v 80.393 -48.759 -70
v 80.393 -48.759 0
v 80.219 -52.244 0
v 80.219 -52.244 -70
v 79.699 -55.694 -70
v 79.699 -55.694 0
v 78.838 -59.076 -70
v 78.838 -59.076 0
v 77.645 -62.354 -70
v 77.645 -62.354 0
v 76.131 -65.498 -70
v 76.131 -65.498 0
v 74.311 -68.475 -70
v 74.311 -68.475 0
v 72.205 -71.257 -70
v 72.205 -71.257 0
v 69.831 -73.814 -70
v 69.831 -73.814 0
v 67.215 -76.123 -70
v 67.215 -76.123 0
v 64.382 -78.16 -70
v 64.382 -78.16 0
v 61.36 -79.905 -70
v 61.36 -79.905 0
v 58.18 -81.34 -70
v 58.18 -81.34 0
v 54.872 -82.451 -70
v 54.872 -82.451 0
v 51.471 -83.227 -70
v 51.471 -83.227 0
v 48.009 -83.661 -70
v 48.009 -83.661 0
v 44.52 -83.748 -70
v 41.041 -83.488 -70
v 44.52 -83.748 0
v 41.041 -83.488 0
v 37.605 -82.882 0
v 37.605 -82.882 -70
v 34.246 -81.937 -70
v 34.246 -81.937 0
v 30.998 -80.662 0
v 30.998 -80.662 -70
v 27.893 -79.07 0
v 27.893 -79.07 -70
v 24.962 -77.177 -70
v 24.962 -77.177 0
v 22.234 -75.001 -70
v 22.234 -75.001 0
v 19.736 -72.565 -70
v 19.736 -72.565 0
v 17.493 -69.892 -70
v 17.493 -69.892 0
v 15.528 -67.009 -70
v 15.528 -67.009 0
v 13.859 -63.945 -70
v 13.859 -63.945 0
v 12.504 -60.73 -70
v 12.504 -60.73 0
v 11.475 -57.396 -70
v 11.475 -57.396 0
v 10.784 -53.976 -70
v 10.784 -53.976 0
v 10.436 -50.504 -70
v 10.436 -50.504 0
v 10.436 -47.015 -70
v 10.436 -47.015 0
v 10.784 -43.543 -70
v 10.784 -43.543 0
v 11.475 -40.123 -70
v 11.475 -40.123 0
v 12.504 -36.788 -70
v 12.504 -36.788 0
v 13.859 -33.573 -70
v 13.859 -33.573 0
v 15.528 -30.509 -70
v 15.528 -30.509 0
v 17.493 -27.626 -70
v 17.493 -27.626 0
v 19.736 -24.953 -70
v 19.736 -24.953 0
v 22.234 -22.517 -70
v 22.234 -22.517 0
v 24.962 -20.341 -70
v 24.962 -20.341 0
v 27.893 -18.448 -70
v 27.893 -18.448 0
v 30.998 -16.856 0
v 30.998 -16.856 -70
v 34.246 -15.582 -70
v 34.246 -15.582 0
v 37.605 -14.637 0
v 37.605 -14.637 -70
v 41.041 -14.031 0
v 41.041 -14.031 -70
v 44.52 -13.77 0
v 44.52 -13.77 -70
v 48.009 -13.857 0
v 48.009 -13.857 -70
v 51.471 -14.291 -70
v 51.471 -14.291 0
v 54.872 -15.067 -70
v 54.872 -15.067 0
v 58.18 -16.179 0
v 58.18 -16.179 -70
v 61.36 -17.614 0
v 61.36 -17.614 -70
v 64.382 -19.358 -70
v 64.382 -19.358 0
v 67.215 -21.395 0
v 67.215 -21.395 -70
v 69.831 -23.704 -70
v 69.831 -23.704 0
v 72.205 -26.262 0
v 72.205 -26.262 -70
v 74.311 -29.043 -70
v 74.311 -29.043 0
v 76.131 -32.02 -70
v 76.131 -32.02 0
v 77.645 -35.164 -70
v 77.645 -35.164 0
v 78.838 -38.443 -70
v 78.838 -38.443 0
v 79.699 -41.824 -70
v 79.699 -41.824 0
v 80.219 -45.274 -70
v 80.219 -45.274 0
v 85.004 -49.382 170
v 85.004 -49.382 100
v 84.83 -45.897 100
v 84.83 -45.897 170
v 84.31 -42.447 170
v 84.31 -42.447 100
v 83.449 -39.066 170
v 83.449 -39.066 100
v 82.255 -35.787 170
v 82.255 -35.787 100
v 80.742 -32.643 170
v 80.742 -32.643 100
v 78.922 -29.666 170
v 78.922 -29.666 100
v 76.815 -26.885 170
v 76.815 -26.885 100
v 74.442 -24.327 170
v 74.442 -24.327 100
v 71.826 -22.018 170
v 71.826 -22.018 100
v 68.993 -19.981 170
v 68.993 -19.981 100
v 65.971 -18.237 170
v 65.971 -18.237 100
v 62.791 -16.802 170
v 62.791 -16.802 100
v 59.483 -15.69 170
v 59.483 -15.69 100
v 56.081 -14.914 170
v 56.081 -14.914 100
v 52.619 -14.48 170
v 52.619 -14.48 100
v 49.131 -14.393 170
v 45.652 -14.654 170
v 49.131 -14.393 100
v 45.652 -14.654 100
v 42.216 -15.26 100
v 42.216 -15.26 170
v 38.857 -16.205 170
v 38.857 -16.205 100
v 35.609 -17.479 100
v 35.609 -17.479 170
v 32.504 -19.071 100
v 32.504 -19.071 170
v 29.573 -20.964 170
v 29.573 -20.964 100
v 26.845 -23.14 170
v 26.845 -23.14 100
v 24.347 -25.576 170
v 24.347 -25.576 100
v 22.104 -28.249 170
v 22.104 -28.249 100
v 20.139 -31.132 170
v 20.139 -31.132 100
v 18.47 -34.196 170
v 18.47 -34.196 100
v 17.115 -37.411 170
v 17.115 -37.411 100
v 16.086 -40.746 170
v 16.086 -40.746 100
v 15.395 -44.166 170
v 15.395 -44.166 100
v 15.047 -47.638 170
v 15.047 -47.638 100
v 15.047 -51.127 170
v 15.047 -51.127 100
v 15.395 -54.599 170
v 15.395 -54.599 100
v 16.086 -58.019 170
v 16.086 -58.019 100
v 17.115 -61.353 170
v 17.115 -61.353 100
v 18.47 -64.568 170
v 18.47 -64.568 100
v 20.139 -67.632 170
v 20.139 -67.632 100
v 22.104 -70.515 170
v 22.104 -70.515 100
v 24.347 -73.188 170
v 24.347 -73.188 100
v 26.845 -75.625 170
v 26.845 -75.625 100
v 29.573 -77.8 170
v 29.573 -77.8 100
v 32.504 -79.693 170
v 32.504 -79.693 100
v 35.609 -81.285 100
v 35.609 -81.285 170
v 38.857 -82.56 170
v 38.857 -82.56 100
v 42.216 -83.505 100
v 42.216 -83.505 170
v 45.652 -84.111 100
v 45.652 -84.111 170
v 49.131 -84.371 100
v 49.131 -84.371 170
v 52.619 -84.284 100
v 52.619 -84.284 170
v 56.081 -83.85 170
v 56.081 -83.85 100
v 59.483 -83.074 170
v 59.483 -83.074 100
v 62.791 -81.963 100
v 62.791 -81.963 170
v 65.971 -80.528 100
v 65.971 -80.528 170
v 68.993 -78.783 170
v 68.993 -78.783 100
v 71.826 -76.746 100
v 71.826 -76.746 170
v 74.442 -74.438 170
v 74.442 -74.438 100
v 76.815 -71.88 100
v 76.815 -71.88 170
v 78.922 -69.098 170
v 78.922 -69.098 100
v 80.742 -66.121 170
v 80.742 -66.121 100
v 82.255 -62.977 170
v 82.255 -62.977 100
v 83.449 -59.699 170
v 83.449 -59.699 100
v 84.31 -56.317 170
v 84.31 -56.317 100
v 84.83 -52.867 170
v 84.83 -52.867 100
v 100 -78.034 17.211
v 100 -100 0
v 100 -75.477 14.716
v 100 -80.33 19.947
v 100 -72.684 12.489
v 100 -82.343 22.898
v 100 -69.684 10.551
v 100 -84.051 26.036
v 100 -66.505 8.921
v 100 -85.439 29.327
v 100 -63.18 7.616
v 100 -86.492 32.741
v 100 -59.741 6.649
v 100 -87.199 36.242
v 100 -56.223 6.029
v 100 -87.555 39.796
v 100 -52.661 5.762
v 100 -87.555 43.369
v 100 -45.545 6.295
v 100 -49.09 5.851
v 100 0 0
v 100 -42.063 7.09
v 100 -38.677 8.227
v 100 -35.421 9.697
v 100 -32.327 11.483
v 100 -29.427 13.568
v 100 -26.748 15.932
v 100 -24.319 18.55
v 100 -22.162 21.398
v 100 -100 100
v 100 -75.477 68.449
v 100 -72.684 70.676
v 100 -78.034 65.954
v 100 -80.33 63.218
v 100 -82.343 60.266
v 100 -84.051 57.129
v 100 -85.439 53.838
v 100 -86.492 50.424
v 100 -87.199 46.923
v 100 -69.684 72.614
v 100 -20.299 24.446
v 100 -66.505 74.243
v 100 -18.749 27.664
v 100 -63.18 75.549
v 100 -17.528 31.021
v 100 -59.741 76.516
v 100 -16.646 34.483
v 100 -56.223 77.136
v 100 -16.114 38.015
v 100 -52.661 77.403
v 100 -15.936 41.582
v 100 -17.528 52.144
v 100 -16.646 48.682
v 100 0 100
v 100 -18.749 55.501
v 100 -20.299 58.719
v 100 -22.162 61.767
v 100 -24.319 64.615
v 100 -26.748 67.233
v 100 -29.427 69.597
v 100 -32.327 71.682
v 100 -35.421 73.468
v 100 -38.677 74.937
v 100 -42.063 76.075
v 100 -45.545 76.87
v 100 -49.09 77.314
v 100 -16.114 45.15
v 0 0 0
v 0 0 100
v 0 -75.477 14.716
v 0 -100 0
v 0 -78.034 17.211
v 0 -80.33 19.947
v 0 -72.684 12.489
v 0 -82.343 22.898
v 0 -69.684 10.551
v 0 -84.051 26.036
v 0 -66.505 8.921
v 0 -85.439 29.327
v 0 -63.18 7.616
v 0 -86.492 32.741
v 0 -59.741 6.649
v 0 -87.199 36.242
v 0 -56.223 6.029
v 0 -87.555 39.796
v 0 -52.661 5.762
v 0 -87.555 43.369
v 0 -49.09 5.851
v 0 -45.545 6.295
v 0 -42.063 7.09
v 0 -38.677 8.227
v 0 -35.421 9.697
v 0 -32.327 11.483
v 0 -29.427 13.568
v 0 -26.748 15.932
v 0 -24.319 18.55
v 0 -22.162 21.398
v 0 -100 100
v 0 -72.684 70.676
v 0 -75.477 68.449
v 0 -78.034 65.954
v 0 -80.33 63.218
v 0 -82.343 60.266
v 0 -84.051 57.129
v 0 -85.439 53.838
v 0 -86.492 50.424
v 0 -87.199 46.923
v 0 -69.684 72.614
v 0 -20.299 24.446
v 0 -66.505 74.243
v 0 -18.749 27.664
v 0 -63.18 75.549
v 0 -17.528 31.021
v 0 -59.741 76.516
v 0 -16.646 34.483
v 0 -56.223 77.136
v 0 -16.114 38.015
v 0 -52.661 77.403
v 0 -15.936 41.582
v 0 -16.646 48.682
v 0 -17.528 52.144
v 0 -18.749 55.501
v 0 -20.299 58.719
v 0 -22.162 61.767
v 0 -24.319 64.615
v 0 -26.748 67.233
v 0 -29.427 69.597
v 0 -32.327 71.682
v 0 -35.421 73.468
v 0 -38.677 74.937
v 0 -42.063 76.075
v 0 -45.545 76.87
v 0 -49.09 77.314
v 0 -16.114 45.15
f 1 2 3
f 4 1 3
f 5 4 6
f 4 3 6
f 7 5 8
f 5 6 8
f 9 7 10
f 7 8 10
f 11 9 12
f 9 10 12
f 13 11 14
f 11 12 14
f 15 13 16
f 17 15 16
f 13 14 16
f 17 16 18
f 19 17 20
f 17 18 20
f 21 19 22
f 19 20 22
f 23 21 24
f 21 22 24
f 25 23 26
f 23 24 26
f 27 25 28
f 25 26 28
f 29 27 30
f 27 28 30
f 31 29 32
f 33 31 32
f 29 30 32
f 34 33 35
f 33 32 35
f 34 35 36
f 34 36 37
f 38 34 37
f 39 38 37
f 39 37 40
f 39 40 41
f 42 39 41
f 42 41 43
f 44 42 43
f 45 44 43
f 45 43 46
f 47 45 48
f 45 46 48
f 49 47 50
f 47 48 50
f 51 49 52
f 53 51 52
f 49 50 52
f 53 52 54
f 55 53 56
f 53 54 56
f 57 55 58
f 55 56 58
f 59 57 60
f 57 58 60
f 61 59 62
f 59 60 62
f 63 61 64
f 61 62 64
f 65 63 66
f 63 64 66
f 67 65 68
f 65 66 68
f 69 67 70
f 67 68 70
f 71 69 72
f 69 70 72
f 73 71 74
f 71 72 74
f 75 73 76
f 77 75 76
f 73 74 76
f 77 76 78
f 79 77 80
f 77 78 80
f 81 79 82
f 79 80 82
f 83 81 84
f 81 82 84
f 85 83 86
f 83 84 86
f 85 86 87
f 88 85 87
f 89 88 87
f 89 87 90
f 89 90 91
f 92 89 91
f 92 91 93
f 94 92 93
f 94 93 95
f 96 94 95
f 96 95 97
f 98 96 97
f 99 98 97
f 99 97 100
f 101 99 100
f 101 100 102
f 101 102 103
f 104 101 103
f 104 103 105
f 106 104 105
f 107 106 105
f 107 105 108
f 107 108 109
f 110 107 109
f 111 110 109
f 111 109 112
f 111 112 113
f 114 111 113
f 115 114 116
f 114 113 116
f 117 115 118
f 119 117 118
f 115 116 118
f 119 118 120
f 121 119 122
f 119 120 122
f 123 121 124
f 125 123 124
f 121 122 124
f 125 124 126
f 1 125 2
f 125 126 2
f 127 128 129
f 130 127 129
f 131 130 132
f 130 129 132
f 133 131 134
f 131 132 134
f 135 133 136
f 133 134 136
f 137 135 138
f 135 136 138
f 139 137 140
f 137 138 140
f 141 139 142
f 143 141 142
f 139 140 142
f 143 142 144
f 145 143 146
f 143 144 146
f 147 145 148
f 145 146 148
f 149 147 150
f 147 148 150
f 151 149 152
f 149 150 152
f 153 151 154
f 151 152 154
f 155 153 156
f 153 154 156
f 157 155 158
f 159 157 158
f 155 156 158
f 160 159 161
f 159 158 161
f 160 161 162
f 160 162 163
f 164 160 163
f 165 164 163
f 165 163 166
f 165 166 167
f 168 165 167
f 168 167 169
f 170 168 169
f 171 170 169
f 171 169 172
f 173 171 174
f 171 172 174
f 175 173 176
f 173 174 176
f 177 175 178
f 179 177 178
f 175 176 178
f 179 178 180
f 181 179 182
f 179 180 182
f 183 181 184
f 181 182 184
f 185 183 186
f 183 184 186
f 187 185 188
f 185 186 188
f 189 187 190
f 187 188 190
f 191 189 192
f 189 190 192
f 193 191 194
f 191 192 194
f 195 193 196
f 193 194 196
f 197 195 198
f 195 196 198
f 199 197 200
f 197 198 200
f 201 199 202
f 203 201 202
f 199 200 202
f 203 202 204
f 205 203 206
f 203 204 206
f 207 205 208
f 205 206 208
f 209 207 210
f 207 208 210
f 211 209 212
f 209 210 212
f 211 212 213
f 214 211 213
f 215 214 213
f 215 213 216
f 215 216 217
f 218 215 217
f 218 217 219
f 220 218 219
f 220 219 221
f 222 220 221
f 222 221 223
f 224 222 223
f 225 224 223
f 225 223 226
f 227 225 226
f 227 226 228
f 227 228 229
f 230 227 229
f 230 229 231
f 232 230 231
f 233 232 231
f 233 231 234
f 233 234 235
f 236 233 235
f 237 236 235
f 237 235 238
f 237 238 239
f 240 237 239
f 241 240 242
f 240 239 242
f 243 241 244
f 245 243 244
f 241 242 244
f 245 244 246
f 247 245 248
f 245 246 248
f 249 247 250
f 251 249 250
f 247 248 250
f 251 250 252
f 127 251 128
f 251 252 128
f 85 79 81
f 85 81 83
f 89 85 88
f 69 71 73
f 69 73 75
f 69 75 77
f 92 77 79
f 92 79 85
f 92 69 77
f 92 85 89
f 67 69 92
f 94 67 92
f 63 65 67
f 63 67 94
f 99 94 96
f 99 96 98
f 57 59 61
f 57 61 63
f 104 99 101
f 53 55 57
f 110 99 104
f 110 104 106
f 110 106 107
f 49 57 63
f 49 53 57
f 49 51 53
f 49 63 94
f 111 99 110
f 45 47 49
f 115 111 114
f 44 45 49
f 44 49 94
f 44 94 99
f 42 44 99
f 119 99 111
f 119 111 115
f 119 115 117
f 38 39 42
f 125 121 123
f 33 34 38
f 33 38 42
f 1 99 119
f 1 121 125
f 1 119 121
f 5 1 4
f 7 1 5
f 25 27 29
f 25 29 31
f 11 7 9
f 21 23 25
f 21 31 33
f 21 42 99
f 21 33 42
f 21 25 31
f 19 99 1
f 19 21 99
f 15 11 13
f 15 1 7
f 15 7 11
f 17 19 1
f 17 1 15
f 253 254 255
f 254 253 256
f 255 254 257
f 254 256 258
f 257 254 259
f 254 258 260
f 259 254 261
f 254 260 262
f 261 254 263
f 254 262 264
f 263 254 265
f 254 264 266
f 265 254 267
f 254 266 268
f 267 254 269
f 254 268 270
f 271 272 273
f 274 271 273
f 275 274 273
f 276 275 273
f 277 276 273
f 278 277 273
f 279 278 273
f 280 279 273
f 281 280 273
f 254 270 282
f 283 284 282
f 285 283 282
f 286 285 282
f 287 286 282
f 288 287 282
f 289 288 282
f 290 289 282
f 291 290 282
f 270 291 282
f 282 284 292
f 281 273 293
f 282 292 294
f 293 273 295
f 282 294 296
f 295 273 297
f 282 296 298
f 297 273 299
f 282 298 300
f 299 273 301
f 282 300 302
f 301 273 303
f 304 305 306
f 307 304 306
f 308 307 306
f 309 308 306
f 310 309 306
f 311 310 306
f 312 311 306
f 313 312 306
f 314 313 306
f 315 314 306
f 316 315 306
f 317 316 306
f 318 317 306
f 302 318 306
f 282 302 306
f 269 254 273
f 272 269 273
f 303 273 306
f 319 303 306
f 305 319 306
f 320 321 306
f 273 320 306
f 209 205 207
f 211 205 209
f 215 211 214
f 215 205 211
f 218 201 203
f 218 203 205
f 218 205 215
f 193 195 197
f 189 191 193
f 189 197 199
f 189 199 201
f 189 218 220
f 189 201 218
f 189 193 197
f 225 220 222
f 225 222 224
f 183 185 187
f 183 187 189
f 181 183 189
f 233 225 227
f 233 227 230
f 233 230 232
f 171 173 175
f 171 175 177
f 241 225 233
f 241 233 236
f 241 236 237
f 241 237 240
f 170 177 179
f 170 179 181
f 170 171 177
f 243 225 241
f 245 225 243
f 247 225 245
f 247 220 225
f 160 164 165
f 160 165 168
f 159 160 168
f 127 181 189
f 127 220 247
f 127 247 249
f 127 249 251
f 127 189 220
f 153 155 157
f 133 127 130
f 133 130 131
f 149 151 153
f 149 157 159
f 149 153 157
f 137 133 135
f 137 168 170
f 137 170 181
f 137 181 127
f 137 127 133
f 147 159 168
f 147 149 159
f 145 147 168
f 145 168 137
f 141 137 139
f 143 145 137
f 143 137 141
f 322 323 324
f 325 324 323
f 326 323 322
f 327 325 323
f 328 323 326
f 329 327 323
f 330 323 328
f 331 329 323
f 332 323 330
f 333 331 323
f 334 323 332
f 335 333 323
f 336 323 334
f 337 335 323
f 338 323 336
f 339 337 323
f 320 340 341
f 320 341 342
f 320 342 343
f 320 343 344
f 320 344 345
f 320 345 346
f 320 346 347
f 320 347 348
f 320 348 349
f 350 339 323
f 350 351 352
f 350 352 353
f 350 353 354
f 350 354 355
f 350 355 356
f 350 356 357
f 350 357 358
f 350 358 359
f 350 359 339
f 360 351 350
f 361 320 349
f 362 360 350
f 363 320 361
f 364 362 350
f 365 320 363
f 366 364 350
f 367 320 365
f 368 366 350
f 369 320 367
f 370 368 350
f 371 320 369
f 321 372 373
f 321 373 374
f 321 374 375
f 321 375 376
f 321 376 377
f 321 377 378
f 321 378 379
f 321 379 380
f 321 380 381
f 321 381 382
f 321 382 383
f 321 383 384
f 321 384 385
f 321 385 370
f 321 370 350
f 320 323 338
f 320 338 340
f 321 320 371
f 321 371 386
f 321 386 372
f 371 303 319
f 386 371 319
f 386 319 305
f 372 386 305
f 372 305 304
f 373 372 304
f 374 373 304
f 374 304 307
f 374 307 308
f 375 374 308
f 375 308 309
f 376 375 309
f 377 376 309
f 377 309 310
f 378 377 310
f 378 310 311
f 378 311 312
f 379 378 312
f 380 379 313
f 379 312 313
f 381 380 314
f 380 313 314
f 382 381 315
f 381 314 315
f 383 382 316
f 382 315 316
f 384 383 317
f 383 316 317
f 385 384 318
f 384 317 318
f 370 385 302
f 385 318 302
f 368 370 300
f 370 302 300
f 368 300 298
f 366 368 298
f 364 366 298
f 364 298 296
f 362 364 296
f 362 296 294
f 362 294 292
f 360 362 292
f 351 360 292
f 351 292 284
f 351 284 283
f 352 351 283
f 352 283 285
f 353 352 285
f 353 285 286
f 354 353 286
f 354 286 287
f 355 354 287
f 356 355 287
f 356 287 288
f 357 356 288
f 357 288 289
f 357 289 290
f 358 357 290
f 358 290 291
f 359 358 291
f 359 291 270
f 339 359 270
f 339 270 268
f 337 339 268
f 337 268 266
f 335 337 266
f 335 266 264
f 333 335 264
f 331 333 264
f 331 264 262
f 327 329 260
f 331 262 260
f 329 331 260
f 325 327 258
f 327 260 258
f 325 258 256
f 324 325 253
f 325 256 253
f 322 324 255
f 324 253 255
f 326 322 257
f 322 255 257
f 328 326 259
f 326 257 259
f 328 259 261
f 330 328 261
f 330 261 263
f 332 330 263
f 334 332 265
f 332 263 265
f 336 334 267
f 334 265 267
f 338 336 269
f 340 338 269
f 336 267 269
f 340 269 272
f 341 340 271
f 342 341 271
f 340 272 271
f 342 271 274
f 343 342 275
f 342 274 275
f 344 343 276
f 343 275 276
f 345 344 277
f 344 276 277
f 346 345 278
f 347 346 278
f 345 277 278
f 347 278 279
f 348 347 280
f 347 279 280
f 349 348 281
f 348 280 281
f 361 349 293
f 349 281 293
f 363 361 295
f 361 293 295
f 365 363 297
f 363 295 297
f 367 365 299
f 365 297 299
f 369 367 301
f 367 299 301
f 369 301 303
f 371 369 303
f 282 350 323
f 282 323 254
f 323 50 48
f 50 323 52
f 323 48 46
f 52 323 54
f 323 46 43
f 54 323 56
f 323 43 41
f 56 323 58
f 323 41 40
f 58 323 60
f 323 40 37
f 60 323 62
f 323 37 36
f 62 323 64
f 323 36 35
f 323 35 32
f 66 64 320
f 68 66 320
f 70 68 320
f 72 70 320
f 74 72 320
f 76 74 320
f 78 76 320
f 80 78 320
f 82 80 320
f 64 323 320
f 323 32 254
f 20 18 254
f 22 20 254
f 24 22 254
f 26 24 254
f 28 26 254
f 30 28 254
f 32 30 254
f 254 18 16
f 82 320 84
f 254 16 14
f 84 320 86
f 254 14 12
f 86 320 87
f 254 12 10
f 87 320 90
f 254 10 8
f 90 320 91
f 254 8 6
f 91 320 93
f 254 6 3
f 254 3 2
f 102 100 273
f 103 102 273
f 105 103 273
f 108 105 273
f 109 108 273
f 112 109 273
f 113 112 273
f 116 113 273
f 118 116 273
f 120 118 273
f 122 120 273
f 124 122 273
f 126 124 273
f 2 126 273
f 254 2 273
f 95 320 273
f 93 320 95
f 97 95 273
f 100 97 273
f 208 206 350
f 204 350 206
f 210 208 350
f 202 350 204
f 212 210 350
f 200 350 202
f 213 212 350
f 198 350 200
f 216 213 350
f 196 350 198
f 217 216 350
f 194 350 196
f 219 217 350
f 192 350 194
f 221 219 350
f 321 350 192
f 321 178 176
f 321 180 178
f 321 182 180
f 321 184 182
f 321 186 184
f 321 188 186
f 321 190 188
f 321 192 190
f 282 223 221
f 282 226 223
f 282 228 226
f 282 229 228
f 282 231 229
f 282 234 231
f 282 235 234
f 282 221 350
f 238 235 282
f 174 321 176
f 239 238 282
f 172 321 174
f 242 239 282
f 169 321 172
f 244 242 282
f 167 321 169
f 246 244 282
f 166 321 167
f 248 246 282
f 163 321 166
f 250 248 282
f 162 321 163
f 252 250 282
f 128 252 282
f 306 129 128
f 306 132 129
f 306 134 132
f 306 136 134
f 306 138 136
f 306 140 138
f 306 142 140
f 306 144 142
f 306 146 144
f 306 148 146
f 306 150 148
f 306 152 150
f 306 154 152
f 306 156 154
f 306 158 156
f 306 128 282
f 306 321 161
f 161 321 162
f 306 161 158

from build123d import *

# Parameters (mm, degrees)
F0_W     = 100
F0_H     = 100
F1_DEPTH = 100
F2_R     = 35
F3_DEPTH = 70
F4_R     = 35
F5_DEPTH = 70
F6_R     = 35.831908
F7_DEPTH = 100.001


with BuildPart() as f1:
    # F0 (on Front) → F1 (new body)
    with BuildSketch(Plane.XZ):
        with Locations((50, 50)):
            Rectangle(F0_W, F0_H)
    extrude(amount=F1_DEPTH)

    # F2 (on face) → F3 (join)
    with BuildSketch(Plane.XY.offset(100)):
        with Locations((50.003812, -49.382195)):
            Circle(F2_R)
    extrude(amount=F3_DEPTH)

    # F4 (on face) → F5 (join)
    with BuildSketch(Plane(origin=(0, 0, 0), x_dir=(1, 0, 0), z_dir=(0, 0, -1))):
        with Locations((45.392986, 48.75914)):
            Circle(F4_R)
    extrude(amount=F5_DEPTH)

    # F6 (on face) → F7 (cut, through all)
    with BuildSketch(Plane.YZ.offset(100)):
        with Locations((-51.767617, 41.582473)):
            Circle(F6_R)
    extrude(amount=-F7_DEPTH, mode=Mode.SUBTRACT)


solid = f1.part
